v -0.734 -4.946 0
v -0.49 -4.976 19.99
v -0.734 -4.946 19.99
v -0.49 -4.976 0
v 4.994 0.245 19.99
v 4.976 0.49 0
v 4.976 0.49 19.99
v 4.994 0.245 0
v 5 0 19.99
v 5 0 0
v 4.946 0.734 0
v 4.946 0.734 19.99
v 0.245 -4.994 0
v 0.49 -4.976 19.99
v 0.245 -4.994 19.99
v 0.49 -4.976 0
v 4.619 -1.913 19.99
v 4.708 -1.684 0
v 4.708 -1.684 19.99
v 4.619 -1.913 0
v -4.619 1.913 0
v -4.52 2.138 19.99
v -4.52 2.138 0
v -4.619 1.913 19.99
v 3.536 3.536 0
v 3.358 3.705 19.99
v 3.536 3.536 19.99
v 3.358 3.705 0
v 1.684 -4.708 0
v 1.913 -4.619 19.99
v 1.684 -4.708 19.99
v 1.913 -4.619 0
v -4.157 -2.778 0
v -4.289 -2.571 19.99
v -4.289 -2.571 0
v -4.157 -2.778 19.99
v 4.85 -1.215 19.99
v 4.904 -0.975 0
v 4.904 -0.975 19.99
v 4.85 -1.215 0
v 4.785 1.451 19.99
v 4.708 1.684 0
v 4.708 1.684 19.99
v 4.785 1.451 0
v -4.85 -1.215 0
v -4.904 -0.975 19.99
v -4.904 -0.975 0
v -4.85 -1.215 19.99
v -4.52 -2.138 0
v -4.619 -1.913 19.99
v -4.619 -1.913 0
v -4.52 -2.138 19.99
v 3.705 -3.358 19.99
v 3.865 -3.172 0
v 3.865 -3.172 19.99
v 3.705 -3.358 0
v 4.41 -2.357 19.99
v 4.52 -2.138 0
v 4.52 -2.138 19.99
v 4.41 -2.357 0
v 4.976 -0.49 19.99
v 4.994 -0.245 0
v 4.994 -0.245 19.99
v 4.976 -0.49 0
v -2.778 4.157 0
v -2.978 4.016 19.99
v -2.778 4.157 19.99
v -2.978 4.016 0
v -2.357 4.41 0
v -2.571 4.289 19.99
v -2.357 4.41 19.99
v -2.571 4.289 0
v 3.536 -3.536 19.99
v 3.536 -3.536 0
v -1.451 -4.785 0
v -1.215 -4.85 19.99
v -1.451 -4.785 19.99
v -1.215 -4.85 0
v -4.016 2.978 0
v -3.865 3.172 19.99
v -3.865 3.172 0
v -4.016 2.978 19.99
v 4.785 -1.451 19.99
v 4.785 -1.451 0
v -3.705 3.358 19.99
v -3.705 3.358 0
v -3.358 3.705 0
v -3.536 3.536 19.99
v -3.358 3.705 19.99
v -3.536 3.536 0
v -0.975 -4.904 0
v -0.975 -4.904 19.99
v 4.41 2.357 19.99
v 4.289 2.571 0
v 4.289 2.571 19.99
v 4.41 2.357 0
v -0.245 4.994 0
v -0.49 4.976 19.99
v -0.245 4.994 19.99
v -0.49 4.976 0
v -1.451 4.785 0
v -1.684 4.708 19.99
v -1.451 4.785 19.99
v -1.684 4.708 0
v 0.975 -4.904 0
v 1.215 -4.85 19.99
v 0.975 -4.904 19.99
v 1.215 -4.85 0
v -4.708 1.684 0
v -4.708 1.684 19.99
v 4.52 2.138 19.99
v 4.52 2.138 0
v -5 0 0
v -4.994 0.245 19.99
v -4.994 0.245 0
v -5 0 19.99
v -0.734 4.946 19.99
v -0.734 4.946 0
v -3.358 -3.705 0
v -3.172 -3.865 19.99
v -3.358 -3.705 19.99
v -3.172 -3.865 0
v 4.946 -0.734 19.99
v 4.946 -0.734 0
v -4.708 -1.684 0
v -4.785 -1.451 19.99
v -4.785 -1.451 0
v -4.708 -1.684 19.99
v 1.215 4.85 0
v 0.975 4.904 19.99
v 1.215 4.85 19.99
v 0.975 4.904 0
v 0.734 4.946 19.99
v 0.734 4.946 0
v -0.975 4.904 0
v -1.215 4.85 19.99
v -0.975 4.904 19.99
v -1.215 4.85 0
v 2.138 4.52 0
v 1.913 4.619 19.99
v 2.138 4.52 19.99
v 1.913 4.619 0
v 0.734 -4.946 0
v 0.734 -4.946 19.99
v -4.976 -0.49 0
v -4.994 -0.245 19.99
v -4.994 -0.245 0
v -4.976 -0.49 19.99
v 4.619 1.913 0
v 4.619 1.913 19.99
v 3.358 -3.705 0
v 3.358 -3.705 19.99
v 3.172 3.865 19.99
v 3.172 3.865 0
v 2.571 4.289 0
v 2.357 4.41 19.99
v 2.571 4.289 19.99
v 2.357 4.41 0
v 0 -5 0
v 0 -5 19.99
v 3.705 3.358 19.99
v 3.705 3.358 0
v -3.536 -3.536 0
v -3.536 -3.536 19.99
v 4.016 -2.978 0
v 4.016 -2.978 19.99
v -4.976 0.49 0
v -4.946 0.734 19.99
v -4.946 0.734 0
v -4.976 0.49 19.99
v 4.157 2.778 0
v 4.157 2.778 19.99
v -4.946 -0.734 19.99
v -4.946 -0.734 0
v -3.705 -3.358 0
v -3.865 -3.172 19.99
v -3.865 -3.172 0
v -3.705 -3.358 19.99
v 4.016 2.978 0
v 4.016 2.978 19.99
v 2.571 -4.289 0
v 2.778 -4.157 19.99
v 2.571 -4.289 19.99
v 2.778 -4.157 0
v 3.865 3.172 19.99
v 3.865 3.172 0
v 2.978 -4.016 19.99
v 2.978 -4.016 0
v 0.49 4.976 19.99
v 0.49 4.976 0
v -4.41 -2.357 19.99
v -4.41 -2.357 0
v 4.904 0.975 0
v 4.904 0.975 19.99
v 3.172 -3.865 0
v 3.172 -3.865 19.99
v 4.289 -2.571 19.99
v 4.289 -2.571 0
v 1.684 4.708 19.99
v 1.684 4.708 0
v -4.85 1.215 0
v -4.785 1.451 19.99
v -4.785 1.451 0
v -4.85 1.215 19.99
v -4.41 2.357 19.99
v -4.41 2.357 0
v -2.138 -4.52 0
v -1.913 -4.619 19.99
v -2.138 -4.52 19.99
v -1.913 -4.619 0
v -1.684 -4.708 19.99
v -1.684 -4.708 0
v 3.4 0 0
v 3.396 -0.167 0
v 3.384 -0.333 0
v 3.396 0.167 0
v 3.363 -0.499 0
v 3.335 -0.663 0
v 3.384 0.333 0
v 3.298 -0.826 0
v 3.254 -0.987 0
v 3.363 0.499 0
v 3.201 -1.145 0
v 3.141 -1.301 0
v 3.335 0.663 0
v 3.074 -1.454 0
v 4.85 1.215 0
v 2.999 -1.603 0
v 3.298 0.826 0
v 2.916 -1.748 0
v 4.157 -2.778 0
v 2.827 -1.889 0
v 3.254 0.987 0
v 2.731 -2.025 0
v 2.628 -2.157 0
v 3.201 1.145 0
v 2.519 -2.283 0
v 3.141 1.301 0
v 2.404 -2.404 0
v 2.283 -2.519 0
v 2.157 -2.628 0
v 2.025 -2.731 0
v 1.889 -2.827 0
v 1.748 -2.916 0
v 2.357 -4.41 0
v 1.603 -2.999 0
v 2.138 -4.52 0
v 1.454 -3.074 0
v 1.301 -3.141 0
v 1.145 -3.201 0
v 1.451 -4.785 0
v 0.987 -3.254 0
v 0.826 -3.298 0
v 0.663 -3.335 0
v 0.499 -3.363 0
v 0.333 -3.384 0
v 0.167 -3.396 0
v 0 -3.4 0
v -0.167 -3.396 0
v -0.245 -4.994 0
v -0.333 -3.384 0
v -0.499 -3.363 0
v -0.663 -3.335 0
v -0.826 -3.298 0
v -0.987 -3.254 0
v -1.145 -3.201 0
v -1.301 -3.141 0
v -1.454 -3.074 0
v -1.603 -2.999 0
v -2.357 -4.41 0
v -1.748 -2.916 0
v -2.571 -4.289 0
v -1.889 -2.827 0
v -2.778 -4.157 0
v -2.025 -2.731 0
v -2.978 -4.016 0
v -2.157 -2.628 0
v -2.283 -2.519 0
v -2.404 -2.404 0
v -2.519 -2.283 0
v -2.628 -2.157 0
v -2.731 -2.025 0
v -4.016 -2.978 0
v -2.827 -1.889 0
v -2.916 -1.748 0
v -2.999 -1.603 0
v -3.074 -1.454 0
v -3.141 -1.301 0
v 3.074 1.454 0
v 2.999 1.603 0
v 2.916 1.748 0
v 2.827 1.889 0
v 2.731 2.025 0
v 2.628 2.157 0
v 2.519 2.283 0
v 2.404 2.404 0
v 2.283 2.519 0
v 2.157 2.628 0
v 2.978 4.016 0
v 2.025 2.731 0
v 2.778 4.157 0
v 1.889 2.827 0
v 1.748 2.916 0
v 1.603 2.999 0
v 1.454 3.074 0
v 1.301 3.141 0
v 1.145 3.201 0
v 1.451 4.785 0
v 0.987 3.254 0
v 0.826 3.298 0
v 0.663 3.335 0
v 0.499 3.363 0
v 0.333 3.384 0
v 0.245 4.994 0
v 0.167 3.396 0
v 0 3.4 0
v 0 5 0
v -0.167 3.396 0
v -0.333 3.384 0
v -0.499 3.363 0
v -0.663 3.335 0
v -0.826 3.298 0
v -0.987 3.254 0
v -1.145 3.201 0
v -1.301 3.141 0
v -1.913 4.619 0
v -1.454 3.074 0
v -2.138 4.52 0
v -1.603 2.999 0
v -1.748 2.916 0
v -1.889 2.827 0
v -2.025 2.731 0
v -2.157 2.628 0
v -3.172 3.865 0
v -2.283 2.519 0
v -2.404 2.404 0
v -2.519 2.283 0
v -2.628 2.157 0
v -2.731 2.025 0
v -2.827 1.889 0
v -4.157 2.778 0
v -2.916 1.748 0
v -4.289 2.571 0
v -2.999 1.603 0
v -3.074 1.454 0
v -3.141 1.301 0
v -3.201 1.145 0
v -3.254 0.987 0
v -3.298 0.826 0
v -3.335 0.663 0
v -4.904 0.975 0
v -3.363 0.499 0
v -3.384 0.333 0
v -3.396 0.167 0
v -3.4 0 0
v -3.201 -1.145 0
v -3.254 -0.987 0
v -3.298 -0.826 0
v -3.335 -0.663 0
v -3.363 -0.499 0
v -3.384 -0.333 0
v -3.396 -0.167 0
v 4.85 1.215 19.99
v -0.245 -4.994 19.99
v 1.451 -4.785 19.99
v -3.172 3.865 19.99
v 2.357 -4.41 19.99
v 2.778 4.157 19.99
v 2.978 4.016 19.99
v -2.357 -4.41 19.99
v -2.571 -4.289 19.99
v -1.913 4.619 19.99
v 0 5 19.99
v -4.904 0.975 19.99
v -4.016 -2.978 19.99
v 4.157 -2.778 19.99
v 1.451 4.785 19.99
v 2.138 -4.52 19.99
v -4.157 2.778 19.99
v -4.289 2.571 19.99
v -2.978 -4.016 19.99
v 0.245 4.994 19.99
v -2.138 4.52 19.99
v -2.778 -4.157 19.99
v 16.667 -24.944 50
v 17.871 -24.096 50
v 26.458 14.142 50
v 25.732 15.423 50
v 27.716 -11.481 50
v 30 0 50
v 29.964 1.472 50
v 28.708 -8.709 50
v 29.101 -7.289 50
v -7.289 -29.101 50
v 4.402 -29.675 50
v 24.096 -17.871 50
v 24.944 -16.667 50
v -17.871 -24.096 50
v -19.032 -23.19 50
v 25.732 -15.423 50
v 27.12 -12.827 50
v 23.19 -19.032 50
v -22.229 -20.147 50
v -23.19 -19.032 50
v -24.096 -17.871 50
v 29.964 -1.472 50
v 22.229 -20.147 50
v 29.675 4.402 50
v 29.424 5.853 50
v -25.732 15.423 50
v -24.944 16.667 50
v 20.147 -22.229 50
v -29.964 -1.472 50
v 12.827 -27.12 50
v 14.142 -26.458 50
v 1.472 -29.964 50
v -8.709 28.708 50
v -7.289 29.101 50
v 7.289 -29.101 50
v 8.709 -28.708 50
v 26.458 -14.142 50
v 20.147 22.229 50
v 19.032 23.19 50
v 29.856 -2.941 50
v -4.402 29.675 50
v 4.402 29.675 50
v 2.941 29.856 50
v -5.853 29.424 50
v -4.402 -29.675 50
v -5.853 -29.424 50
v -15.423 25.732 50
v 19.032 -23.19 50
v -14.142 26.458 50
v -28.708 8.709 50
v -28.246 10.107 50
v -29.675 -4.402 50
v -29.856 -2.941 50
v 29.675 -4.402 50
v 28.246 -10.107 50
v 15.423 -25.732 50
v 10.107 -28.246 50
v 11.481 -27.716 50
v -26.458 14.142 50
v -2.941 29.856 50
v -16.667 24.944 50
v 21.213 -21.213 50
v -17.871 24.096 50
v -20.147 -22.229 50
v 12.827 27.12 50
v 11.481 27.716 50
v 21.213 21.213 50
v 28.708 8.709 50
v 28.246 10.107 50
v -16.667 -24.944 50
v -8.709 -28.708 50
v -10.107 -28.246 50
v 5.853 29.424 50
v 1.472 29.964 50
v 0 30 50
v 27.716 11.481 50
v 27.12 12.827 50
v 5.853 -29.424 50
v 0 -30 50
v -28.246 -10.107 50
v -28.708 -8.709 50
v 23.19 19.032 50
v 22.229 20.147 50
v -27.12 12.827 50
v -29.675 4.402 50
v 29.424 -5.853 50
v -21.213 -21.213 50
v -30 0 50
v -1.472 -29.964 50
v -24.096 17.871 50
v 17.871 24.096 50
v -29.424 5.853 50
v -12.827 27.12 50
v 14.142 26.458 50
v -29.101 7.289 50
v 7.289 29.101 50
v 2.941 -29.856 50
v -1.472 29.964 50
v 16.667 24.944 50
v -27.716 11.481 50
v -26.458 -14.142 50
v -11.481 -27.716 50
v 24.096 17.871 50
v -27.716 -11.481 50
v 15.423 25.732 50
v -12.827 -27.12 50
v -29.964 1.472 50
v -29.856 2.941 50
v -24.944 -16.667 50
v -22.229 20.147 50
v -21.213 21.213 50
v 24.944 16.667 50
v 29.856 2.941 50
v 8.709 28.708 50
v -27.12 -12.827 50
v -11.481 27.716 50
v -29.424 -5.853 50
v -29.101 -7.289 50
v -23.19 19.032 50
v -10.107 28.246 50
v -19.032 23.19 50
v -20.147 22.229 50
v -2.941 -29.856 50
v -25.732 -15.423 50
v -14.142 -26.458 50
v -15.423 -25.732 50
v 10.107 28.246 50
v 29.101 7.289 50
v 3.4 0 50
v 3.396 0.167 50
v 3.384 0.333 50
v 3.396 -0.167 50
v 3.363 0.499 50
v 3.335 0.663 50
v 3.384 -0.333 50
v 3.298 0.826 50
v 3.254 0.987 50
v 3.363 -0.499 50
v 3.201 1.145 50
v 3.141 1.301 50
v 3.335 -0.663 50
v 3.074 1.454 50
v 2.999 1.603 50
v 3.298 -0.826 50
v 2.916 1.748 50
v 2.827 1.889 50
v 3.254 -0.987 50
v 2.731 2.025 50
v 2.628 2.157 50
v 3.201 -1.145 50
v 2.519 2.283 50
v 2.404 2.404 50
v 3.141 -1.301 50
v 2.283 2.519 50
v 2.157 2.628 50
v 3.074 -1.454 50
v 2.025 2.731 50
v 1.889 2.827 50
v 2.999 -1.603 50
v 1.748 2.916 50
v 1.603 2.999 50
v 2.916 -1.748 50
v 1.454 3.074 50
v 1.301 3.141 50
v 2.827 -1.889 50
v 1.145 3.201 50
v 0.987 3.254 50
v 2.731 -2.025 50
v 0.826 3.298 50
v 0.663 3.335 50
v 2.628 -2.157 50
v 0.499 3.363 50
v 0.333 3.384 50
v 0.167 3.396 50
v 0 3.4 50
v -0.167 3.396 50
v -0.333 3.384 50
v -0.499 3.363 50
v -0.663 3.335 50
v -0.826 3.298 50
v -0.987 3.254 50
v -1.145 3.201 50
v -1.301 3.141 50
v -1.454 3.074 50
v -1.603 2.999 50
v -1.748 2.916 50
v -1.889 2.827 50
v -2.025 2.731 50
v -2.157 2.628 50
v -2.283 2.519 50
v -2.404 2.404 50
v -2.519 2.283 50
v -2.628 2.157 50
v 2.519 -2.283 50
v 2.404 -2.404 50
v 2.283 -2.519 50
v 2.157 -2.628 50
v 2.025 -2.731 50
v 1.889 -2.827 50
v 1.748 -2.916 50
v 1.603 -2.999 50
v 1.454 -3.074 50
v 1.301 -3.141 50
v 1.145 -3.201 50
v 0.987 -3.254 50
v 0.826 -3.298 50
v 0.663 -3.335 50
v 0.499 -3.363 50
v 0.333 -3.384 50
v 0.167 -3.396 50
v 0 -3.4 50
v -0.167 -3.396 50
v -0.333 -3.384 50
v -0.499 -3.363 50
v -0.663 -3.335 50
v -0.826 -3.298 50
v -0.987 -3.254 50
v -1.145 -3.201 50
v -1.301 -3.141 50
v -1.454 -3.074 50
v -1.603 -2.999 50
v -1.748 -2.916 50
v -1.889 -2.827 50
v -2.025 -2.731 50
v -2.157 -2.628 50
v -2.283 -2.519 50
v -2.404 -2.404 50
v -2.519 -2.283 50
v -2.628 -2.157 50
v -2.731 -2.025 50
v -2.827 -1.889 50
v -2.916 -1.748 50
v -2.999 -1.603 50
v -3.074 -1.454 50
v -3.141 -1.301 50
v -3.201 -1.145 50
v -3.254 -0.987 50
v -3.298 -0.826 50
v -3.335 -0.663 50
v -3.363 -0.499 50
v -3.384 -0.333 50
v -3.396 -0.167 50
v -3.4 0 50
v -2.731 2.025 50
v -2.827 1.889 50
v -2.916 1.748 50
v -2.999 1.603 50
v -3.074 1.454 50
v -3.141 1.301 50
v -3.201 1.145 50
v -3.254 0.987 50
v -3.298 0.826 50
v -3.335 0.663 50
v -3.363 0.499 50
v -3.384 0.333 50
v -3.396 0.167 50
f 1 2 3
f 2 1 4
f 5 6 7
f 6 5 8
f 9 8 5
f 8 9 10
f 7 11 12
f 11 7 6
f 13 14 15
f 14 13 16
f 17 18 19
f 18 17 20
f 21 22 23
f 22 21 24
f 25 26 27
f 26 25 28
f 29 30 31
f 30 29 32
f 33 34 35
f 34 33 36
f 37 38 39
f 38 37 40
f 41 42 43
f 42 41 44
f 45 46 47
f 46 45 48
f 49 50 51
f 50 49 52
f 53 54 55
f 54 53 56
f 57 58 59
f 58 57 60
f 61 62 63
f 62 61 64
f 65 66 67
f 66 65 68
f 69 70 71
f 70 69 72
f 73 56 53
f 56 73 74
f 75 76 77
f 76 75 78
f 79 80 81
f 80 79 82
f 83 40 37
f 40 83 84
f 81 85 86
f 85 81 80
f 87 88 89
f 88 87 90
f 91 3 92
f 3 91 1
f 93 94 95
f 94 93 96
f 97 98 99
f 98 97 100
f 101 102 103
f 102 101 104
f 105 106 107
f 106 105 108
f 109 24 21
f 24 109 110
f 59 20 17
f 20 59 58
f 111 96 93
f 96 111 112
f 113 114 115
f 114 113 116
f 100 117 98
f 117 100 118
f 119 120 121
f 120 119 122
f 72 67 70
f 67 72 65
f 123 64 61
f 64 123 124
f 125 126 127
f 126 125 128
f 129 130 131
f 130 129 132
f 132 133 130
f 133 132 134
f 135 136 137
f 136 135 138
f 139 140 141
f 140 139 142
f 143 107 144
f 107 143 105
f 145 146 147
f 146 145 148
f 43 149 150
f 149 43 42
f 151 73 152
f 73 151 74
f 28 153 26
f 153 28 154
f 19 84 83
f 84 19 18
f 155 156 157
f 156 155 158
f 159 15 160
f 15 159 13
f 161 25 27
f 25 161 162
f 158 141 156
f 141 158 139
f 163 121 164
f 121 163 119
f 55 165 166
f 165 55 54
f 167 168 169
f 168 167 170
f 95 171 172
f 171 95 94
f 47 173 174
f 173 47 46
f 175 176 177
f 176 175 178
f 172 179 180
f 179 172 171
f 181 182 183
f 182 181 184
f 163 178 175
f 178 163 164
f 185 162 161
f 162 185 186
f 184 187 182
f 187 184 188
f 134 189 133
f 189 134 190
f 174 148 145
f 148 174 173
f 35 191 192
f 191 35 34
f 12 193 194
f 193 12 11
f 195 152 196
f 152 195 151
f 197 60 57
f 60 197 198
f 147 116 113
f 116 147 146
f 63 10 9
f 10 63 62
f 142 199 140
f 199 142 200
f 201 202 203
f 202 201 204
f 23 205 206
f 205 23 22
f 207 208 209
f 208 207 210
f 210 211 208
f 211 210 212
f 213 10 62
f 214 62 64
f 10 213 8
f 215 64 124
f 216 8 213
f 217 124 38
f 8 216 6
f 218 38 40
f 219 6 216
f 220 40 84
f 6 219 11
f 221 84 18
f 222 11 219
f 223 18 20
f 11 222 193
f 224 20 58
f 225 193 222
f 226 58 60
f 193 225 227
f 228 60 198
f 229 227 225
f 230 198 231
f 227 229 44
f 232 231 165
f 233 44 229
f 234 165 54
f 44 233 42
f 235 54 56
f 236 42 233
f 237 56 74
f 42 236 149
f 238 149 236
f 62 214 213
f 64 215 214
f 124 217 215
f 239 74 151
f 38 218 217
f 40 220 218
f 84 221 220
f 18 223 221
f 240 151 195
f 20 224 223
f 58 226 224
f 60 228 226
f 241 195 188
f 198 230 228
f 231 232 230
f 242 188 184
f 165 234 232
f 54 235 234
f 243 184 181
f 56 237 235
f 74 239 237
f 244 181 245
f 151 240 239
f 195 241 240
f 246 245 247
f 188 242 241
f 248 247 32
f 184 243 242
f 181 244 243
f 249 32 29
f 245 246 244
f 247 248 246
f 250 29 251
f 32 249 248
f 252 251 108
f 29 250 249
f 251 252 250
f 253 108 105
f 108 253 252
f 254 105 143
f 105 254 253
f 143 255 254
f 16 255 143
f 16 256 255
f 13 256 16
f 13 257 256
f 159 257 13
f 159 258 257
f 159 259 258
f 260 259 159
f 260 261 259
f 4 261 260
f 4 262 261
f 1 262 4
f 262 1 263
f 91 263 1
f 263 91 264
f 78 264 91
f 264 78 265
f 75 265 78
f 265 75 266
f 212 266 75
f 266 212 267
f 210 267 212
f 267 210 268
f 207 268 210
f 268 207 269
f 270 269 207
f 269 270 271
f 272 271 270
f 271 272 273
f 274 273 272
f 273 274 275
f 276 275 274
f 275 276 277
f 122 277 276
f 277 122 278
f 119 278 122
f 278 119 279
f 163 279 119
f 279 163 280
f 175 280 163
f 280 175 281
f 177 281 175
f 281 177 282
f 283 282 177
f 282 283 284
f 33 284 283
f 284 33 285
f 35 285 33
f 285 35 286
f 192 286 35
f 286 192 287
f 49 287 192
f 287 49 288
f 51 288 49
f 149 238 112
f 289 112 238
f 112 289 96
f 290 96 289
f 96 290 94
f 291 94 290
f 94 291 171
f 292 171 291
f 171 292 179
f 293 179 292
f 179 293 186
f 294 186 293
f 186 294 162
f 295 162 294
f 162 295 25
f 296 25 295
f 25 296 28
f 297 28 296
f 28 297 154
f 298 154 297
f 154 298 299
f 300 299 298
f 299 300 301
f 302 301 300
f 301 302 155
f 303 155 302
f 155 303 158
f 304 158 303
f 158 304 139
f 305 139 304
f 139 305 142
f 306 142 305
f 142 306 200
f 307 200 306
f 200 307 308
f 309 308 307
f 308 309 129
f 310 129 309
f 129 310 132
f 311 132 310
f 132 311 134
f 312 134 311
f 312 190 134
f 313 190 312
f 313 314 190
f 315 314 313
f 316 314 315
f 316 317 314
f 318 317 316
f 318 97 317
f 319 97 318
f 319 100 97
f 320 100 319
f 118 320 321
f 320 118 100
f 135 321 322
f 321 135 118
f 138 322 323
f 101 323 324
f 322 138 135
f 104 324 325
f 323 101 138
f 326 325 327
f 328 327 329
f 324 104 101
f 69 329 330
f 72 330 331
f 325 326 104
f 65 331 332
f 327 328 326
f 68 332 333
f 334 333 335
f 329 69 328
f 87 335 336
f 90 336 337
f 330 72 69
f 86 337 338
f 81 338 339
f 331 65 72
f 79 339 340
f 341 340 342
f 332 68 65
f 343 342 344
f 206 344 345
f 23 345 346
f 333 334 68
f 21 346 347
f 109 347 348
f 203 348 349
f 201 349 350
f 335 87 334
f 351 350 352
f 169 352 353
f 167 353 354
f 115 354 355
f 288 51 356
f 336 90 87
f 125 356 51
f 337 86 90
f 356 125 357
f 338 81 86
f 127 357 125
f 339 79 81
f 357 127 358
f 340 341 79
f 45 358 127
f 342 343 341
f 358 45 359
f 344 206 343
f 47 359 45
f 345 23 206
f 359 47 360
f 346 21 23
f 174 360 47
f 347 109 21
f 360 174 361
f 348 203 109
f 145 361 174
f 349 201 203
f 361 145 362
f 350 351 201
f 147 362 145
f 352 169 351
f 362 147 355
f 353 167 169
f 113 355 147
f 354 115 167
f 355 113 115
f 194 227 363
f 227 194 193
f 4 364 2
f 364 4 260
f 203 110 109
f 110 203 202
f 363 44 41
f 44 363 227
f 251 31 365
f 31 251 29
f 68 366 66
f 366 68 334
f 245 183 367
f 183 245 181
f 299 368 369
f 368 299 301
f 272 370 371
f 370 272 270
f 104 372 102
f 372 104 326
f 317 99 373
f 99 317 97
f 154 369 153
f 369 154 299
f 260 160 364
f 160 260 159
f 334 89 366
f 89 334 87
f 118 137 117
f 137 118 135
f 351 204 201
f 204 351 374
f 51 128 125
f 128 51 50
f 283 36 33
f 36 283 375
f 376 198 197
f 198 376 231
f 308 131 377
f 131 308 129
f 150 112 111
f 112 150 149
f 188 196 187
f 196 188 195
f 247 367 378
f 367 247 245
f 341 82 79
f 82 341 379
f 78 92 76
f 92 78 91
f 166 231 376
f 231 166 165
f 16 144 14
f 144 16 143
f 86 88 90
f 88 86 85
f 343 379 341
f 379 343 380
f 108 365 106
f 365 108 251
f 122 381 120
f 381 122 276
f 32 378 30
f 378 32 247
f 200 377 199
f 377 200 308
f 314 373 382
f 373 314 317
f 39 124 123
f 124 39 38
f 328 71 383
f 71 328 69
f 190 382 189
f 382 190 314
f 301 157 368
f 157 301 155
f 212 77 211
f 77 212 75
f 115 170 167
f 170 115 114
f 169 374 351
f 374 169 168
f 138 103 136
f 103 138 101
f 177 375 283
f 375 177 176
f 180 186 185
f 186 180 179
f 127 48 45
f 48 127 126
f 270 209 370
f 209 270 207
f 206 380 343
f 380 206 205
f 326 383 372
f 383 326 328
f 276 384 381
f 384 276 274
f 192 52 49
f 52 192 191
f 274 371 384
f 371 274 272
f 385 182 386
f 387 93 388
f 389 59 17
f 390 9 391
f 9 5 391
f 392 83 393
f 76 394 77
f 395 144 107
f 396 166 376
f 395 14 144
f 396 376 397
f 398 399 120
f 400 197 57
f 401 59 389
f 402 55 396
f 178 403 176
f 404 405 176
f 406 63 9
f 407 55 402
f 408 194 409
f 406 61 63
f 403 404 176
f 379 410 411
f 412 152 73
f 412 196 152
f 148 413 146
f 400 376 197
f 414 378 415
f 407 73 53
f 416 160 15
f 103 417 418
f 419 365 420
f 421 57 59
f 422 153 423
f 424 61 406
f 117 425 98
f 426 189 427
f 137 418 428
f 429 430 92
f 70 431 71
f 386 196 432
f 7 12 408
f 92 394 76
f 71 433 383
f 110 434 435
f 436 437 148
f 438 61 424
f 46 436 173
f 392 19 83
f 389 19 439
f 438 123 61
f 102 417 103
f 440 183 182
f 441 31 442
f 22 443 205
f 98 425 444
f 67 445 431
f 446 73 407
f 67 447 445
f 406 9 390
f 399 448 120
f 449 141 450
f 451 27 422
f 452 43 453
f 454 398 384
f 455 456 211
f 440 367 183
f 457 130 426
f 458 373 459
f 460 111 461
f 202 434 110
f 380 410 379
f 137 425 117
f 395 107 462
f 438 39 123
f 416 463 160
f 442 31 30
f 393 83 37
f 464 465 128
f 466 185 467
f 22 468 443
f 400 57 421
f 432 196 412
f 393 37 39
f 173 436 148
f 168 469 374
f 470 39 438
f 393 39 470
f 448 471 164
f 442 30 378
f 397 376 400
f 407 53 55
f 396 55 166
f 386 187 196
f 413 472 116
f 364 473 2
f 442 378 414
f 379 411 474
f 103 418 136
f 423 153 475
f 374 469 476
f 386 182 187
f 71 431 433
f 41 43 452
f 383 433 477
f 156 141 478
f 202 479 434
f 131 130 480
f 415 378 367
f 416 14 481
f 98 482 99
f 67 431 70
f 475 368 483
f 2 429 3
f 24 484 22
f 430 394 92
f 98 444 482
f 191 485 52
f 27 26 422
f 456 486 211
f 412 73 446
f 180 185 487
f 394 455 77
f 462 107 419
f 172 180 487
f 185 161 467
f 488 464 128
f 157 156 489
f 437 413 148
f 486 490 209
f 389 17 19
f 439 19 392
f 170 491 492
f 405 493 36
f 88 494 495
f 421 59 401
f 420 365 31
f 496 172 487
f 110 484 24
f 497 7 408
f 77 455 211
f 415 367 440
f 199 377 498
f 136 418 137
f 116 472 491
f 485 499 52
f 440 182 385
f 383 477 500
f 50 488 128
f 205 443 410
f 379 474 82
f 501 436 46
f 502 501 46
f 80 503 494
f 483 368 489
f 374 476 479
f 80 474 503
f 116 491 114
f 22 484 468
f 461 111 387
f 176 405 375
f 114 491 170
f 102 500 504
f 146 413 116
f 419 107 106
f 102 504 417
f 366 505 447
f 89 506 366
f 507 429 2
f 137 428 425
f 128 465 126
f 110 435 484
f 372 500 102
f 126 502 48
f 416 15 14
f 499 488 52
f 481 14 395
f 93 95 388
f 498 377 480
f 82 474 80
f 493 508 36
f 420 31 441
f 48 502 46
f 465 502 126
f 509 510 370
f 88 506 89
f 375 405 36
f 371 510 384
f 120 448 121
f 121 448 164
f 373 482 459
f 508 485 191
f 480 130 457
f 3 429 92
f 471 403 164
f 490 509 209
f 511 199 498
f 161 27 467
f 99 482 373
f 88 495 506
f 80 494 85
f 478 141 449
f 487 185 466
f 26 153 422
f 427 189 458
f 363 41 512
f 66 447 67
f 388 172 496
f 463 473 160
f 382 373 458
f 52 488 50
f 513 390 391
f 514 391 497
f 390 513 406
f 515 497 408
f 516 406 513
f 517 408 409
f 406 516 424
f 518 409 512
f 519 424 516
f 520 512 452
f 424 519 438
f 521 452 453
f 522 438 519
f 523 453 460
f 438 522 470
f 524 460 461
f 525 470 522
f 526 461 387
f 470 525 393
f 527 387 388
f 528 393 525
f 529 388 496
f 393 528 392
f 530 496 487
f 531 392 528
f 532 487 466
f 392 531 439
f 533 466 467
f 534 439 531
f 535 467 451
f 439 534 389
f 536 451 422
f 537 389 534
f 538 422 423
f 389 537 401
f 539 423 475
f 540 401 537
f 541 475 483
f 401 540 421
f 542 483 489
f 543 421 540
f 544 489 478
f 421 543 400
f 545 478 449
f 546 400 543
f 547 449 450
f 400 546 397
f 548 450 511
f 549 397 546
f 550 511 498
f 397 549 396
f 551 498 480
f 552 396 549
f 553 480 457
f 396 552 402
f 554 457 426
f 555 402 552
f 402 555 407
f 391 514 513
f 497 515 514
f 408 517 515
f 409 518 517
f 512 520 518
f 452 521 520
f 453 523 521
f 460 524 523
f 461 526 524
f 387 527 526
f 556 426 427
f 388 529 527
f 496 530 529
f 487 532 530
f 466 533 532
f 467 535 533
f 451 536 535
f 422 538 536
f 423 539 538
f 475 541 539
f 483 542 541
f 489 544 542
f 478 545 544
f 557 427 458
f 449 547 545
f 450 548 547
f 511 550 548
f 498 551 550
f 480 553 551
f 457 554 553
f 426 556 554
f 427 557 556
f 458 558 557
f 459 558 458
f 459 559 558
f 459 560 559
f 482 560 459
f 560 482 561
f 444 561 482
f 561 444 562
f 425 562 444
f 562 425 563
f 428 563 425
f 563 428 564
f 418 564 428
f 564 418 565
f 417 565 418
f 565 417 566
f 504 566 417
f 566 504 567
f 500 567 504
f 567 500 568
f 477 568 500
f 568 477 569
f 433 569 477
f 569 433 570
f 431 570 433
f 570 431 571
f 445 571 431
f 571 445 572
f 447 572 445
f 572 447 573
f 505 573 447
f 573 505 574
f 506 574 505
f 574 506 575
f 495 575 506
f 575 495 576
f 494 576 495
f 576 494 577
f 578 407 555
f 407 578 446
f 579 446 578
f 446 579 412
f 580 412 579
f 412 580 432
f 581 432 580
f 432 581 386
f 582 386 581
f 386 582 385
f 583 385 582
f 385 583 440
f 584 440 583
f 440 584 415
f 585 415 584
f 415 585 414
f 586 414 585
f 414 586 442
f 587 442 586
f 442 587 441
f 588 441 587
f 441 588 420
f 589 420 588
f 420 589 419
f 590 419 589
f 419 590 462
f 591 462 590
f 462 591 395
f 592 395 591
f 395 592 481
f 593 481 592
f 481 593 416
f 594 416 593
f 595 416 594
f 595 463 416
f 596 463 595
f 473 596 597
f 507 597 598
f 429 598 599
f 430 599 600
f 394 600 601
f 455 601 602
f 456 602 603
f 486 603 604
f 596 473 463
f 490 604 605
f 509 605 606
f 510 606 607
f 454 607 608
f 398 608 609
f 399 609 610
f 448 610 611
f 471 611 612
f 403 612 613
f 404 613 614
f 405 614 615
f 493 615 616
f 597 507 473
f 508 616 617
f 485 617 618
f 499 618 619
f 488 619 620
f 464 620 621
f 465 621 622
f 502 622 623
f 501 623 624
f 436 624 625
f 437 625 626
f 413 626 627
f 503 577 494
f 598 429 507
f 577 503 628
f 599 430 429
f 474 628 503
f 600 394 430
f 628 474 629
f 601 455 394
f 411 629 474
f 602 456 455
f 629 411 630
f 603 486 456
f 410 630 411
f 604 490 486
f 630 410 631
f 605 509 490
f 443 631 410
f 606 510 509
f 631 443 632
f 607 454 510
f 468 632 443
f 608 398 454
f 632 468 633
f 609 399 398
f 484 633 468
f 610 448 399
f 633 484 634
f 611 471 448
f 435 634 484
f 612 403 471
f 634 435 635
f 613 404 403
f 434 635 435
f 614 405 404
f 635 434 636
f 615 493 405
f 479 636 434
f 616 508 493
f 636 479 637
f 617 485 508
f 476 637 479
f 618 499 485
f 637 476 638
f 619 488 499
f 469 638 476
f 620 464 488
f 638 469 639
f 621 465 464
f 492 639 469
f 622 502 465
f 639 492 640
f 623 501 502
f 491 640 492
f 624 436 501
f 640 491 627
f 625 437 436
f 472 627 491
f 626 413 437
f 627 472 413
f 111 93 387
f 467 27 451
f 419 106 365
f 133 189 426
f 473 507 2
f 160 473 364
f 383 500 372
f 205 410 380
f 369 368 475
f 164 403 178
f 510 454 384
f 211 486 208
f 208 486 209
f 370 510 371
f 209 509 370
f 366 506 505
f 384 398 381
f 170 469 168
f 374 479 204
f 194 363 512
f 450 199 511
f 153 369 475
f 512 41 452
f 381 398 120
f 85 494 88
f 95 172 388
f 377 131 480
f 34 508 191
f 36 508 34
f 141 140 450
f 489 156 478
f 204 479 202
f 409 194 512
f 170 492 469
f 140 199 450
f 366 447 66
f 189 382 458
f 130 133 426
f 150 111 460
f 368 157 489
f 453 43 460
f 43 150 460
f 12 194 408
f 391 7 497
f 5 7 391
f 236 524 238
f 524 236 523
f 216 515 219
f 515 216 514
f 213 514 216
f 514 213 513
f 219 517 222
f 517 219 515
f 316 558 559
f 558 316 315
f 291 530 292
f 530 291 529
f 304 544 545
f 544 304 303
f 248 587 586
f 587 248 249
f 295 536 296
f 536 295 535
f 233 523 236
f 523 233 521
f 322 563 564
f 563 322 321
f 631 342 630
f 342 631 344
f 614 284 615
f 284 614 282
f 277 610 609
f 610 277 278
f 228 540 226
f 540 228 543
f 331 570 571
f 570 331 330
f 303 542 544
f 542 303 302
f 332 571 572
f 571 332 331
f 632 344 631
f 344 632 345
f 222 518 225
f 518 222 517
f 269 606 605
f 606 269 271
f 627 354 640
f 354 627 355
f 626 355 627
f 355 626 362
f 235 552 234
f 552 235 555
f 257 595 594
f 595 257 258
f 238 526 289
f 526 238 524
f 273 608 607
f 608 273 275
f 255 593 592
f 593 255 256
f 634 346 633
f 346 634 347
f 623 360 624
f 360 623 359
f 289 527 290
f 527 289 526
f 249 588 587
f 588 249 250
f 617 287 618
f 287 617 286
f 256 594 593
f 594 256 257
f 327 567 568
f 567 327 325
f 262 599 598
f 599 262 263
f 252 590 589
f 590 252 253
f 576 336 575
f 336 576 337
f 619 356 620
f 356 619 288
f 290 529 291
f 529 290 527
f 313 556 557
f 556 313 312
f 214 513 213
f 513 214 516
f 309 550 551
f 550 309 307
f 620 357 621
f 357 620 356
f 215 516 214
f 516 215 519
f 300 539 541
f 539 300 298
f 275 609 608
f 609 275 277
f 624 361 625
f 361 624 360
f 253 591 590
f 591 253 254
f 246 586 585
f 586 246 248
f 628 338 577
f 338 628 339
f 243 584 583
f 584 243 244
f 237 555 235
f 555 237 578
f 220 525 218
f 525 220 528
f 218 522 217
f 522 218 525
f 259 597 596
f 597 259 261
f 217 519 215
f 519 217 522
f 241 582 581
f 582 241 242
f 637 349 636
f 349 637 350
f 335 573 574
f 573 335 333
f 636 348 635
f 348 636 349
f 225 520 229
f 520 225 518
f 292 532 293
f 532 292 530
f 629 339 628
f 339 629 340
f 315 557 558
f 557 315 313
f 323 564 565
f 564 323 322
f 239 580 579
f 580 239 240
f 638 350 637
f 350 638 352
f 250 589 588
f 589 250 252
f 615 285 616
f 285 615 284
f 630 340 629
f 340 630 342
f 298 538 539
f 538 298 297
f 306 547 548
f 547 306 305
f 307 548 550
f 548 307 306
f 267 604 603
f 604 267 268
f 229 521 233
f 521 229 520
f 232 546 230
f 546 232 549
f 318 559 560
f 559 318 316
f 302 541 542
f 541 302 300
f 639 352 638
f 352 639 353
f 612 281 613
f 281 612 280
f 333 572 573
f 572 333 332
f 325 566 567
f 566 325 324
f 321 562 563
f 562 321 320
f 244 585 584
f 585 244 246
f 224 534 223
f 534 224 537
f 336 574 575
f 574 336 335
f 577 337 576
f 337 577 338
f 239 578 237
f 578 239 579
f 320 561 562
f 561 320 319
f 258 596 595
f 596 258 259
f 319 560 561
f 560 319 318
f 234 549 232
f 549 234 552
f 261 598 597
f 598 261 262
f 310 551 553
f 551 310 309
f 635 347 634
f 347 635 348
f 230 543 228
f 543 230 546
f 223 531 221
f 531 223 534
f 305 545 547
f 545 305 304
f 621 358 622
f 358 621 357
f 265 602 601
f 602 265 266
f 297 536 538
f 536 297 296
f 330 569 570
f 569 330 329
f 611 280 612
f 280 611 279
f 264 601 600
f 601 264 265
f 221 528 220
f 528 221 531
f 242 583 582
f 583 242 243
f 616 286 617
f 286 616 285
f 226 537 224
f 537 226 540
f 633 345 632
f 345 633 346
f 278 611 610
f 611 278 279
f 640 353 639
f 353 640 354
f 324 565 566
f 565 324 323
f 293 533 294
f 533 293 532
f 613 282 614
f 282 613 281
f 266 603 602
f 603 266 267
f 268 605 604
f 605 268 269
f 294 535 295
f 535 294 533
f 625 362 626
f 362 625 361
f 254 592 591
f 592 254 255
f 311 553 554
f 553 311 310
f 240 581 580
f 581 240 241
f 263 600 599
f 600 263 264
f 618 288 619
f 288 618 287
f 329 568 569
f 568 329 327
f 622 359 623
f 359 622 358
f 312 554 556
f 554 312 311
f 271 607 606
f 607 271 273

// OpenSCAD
// Small lab funnel, printed upright: spout at bottom (z = 0), wide opening at top
// All dimensions in mm

$fn = 128;

// ---- Spout ----
spout_od      = 10;    // spout outer diameter
spout_id      = spout_od - 2 * 1.6;   // spout bore = 6.8
spout_h       = 20;    // spout height (z = 0 to 20)

// ---- Cone ----
cone_od_top   = 60;    // cone outer diameter at rim
cone_od_base  = spout_od;              // cone meets spout at 10 mm
cone_h        = 50 - 20;               // cone height = 30 (z = 20 to 50)

// ---- Wall ----
wall          = 1.6;   // uniform wall thickness

// ---- Model ----
difference() {
    union() {
        // Spout tube
        translate([0, 0, 0])
            cylinder(d = spout_od, h = spout_h);
        // Cone (slightly overlapping spout for a clean union)
        translate([0, 0, spout_h - 0.01])
            cylinder(d1 = cone_od_base, d2 = cone_od_top, h = cone_h + 0.01);
    }
    // Through-bore from bottom up past the rim
    translate([0, 0, -1])
        cylinder(d = spout_id, h = spout_h + cone_h + 2);
}
